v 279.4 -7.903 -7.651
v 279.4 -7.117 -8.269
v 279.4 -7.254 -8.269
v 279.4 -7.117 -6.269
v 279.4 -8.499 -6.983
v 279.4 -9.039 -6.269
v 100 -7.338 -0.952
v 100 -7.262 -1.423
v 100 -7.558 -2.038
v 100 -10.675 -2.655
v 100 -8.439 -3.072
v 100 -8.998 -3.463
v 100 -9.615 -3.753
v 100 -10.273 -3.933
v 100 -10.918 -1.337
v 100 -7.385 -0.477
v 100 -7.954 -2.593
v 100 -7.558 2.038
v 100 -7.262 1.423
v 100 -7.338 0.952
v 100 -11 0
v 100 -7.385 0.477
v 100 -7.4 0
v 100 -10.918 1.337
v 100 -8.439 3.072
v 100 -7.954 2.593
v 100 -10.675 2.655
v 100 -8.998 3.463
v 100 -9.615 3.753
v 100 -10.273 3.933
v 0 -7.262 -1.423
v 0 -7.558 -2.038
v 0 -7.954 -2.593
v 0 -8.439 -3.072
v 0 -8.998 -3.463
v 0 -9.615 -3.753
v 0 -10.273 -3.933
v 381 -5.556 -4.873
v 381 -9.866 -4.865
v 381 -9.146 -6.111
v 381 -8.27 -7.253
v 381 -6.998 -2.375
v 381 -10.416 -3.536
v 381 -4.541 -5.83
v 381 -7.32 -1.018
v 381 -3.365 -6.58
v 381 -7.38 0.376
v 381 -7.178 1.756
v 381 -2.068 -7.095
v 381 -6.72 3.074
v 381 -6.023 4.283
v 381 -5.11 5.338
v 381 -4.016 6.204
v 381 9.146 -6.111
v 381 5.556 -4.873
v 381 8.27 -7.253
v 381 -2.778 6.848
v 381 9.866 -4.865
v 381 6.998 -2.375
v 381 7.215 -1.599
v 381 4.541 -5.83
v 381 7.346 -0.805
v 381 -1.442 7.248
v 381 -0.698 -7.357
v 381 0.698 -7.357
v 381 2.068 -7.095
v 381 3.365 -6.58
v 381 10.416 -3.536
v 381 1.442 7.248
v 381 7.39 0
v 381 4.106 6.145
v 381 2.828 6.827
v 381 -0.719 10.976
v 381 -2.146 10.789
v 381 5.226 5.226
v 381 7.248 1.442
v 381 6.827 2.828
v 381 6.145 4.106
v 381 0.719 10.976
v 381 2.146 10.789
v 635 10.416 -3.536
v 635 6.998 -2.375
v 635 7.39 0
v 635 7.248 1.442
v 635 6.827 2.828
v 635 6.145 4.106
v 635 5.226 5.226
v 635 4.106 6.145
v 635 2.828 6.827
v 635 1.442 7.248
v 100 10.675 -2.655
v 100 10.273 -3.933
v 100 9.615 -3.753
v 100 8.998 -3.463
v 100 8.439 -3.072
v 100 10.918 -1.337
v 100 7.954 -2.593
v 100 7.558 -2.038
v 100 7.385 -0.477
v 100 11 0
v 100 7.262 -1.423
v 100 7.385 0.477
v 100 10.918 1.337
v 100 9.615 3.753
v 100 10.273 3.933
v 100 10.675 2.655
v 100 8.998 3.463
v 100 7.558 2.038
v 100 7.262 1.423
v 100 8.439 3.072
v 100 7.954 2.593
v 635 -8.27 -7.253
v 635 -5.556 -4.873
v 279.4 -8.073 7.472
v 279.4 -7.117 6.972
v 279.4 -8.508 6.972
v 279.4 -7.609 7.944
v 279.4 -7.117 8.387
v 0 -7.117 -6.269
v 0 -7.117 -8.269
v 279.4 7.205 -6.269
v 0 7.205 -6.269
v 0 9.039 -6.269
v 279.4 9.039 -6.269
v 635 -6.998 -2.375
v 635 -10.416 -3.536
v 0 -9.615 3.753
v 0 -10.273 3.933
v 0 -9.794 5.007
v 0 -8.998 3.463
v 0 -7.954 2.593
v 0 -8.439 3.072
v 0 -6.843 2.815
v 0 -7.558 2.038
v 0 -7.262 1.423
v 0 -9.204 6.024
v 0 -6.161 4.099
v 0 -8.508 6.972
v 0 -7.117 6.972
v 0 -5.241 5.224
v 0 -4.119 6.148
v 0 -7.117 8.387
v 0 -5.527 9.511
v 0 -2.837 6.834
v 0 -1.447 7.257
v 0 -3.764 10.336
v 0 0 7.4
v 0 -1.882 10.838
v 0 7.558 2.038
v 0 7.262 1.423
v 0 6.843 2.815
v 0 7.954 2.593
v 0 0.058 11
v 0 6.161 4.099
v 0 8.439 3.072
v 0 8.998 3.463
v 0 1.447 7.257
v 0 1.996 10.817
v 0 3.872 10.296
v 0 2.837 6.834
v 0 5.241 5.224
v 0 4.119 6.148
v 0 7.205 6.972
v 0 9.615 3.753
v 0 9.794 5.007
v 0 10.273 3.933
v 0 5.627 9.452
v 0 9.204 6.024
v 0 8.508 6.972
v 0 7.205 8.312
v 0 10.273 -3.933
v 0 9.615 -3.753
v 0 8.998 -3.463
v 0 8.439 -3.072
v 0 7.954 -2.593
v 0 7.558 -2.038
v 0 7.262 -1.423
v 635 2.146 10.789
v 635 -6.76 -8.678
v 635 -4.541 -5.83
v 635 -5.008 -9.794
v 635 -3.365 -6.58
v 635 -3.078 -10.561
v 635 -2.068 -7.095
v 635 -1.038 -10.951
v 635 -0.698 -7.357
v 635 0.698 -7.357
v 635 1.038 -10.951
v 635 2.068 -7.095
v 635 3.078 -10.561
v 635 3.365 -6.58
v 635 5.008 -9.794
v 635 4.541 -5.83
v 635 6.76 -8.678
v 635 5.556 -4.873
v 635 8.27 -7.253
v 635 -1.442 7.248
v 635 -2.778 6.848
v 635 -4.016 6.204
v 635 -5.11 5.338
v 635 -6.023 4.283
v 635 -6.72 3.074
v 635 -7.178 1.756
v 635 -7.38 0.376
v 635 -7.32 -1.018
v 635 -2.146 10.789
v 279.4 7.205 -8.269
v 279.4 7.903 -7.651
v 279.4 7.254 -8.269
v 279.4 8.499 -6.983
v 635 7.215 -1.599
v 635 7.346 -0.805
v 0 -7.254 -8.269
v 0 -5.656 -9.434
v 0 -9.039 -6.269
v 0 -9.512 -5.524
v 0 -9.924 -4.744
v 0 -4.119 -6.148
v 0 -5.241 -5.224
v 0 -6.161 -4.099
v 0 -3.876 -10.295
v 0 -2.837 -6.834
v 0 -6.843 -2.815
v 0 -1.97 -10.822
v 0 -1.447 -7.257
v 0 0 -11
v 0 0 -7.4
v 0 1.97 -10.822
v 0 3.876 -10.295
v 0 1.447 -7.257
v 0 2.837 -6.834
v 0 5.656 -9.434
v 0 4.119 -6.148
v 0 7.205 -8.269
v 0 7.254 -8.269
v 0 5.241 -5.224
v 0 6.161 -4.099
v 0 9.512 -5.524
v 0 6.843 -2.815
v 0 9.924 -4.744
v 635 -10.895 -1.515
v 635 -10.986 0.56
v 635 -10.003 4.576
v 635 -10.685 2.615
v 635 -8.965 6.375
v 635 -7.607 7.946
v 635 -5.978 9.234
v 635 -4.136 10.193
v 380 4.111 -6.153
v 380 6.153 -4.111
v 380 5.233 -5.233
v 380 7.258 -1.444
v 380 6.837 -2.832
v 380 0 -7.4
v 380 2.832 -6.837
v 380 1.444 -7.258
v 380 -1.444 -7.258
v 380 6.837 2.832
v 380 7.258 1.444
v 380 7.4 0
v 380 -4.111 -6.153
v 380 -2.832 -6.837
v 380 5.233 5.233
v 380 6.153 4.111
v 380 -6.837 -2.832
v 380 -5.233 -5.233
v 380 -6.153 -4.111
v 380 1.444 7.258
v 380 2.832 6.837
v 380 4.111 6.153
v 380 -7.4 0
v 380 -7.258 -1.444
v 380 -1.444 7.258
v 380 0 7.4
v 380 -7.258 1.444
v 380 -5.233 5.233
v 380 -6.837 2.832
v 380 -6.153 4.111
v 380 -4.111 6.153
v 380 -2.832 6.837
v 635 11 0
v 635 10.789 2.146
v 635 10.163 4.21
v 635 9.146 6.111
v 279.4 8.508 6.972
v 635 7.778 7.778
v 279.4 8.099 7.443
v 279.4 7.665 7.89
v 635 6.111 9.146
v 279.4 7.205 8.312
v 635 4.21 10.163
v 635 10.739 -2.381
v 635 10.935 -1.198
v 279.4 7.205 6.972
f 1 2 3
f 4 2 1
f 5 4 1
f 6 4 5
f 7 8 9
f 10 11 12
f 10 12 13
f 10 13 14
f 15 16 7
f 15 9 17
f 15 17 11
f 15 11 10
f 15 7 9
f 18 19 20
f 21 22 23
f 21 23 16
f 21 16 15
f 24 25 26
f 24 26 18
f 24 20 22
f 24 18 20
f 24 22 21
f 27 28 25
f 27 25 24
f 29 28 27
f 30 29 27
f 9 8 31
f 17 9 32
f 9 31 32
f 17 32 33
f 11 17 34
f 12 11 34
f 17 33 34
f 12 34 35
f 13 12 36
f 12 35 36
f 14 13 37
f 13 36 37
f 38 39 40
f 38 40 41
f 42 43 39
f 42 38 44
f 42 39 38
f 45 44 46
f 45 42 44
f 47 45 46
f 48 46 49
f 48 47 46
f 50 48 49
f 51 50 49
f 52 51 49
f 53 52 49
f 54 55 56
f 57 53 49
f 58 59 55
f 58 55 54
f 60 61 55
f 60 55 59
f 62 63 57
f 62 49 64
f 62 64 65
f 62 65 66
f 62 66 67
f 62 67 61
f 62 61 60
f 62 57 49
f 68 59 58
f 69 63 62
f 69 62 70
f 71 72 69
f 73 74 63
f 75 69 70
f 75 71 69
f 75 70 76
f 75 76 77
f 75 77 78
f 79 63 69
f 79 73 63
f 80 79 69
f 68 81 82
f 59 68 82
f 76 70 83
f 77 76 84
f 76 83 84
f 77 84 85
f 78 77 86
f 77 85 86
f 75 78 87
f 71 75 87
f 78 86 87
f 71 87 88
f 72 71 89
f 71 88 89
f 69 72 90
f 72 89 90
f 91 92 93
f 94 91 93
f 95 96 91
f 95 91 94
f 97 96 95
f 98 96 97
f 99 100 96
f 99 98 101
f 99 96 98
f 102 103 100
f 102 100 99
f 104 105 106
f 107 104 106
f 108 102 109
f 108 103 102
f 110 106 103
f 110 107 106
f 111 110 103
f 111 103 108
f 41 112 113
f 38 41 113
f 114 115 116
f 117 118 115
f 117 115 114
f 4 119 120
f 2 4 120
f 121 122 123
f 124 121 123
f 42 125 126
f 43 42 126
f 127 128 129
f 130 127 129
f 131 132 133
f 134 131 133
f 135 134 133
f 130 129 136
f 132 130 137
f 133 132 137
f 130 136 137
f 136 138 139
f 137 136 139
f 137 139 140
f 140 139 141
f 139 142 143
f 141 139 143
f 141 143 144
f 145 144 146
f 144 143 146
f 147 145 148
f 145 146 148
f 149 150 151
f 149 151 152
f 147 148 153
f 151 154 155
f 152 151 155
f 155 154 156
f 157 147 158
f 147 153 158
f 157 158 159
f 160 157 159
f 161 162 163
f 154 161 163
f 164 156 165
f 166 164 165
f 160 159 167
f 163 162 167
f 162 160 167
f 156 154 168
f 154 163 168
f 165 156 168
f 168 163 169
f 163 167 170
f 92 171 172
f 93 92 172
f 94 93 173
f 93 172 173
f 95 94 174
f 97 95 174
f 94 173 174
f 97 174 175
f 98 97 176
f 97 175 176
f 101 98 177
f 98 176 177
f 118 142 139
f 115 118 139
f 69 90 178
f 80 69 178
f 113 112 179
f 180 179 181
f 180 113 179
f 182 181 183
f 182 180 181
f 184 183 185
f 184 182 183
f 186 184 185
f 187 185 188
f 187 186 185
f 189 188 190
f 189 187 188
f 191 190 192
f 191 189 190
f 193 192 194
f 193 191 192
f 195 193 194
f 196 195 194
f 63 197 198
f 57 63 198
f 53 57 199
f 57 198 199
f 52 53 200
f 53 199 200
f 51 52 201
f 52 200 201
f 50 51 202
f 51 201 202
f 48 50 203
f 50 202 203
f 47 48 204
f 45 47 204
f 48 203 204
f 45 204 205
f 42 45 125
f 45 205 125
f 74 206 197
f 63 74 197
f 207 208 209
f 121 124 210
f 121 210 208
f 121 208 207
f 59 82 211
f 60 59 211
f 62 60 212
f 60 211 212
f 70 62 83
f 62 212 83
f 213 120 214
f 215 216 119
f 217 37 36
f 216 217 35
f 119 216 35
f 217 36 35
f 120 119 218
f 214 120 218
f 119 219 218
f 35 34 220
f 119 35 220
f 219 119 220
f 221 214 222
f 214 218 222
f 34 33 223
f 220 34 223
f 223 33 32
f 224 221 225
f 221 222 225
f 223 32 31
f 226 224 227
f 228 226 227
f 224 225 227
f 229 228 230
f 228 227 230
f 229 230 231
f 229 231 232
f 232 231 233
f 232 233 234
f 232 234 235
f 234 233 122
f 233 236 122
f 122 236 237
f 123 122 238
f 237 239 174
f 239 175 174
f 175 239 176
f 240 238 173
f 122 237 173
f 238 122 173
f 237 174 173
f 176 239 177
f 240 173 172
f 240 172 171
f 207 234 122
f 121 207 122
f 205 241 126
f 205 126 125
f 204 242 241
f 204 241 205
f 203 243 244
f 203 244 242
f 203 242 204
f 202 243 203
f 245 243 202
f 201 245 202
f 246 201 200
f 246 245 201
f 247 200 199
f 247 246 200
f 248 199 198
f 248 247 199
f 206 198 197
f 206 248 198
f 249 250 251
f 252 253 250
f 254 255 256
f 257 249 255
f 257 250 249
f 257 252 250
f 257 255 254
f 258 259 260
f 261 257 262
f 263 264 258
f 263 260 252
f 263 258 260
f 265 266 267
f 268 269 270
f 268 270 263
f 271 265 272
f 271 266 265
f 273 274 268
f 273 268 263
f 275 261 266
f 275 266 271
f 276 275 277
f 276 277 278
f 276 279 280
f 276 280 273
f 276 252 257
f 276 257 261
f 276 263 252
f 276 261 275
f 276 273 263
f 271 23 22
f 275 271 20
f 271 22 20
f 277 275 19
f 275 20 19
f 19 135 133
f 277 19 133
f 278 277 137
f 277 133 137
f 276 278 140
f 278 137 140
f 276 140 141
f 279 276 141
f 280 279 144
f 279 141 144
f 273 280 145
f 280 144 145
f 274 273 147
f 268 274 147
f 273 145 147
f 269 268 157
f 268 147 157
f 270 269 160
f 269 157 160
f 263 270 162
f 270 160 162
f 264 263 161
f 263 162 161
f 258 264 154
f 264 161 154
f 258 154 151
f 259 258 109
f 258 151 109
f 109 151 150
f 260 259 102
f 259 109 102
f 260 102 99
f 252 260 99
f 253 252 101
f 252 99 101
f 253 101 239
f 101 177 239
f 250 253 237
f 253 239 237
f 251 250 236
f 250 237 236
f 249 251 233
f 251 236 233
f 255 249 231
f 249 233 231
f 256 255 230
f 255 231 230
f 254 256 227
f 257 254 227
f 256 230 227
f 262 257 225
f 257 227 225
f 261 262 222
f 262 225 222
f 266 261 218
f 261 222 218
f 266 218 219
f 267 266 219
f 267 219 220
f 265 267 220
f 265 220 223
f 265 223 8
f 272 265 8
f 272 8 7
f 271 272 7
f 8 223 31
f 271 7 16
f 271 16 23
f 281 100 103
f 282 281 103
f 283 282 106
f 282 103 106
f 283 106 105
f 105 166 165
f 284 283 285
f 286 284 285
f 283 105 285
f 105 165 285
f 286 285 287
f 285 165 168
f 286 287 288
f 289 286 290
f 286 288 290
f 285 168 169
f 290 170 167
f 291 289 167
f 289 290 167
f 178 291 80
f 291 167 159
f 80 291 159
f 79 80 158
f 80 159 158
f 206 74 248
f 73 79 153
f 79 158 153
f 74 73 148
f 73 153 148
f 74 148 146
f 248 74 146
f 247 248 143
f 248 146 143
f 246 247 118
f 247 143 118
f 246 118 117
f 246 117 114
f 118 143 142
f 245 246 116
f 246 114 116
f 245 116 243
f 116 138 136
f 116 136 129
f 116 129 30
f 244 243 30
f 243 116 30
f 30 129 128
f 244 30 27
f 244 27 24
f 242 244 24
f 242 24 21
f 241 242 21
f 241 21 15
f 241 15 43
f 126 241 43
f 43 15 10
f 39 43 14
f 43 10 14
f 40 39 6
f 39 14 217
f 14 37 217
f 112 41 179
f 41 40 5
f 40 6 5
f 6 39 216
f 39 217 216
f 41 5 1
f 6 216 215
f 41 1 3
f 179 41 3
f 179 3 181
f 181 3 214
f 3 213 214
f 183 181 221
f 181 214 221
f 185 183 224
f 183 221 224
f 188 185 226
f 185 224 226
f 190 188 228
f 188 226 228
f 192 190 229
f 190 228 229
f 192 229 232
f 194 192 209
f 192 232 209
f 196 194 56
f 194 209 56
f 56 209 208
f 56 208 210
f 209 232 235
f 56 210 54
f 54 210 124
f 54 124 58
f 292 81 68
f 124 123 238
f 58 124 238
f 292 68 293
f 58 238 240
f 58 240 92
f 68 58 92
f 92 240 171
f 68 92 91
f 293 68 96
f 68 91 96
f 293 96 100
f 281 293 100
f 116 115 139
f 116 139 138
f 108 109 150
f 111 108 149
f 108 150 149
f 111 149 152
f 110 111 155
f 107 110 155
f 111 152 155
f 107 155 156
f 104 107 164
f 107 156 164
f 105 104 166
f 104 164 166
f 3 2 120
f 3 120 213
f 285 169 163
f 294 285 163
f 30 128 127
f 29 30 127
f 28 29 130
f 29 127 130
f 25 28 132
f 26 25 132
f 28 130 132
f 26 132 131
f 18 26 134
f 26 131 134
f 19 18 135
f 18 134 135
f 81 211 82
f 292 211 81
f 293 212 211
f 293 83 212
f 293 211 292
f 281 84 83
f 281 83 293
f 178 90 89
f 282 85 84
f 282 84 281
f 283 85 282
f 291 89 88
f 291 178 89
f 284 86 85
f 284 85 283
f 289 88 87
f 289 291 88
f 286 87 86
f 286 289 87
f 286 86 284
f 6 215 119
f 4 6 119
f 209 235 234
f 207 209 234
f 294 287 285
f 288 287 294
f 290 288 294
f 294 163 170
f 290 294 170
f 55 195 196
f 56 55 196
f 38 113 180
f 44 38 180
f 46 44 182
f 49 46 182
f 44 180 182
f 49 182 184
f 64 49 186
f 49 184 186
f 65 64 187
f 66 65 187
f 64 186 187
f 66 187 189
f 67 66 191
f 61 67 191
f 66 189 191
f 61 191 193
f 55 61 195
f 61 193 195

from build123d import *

# Parameters (mm, degrees)
F0_R     = 11
F1_DEPTH = 635
F3_DEPTH = 254
F4_R     = 7.4
F5_DEPTH = 380
F7_DEPTH = 279.4
F8_DEPTH = 100


with BuildPart() as f1:
    # F0 (on Right) → F1 (new body)
    with BuildSketch(Plane.YZ):
        Circle(F0_R)
    extrude(amount=F1_DEPTH)

    # F2 (on face) → F3 (cut)
    with BuildSketch(Plane.YZ.offset(635)):
        with BuildLine():
            ThreePointArc((0, 7.39), (0.724346667, 7.3544151301), (1.4417174797, 7.2480032222))
            Line((1.4417174797, 7.2480032222), (2.1459935422, 10.7886380844))
            ThreePointArc((2.1459935422, 10.7886380844), (0, 11), (-2.1459935422, 10.7886380844))
            Line((-2.1459935422, 10.7886380844), (-1.4417174797, 7.2480032222))
            ThreePointArc((-1.4417174797, 7.2480032222), (-0.724346667, 7.3544151301), (0, 7.39))
        make_face()
        with BuildLine():
            Line((-6.997813657, -2.3754376486), (0, 0))
            Line((0, 0), (-1.4417174797, 7.2480032222))
            ThreePointArc((-1.4417174797, 7.2480032222), (-6.399927734, 3.695), (-6.997813657, -2.3754376486))
        make_face()
        with BuildLine():
            Line((-5.5560961773, -4.8725655736), (0, 0))
            Line((0, 0), (-6.997813657, -2.3754376486))
            ThreePointArc((-6.997813657, -2.3754376486), (-6.399927734, -3.695), (-5.5560961773, -4.8725655736))
        make_face()
        with BuildLine():
            Line((5.5560961773, -4.8725655736), (0, 0))
            Line((0, 0), (-5.5560961773, -4.8725655736))
            ThreePointArc((-5.5560961773, -4.8725655736), (0, -7.39), (5.5560961773, -4.8725655736))
        make_face()
        with BuildLine():
            ThreePointArc((5.5560961773, -4.8725655736), (6.399927734, -3.695), (6.997813657, -2.3754376486))
            Line((6.997813657, -2.3754376486), (0, 0))
            Line((0, 0), (5.5560961773, -4.8725655736))
        make_face()
        with BuildLine():
            ThreePointArc((6.997813657, -2.3754376486), (7.2912942241, -1.2037975484), (7.39, 0))
            ThreePointArc((7.39, 0), (5.7125472504, 4.68816637), (1.4417174797, 7.2480032222))
            Line((1.4417174797, 7.2480032222), (0, 0))
            Line((0, 0), (6.997813657, -2.3754376486))
        make_face()
        with BuildLine():
            Line((0, 0), (1.4417174797, 7.2480032222))
            ThreePointArc((1.4417174797, 7.2480032222), (0.724346667, 7.3544151301), (0, 7.39))
            Line((0, 7.39), (0, 0))
        make_face()
        with BuildLine():
            Line((0, 0), (0, 7.39))
            ThreePointArc((0, 7.39), (-0.724346667, 7.3544151301), (-1.4417174797, 7.2480032222))
            Line((-1.4417174797, 7.2480032222), (0, 0))
        make_face()
        with BuildLine():
            ThreePointArc((-5.5560961773, -4.8725655736), (-6.399927734, -3.695), (-6.997813657, -2.3754376486))
            Line((-6.997813657, -2.3754376486), (-10.4162314244, -3.5358341183))
            ThreePointArc((-10.4162314244, -3.5358341183), (-9.5262794416, -5.5), (-8.2702378823, -7.2528039661))
            Line((-8.2702378823, -7.2528039661), (-5.5560961773, -4.8725655736))
        make_face()
        with BuildLine():
            Line((10.4162314244, -3.5358341183), (6.997813657, -2.3754376486))
            ThreePointArc((6.997813657, -2.3754376486), (6.399927734, -3.695), (5.5560961773, -4.8725655736))
            Line((5.5560961773, -4.8725655736), (8.2702378823, -7.2528039661))
            ThreePointArc((8.2702378823, -7.2528039661), (9.5262794416, -5.5), (10.4162314244, -3.5358341183))
        make_face()
    extrude(amount=-F3_DEPTH, mode=Mode.SUBTRACT)

    # F4 (on face) → F5 (cut)
    with BuildSketch(Plane(origin=(0, 0, 0), x_dir=(0, -1, 0), z_dir=(-1, 0, 0))):
        Circle(F4_R)
    extrude(amount=-F5_DEPTH, mode=Mode.SUBTRACT)

    # F6 (on face) → F7 (cut)
    with BuildSketch(Plane(origin=(0, 0, 0), x_dir=(0, -1, 0), z_dir=(-1, 0, 0))):
        with BuildLine():
            Line((7.1172844619, 8.3871486149), (7.1172844619, 6.972222589))
            Line((7.1172844619, 6.972222589), (8.5081203665, 6.972222589))
            ThreePointArc((8.5081203665, 6.972222589), (7.8446684396, 7.7111073831), (7.1172844619, 8.3871486149))
        make_face()
        with BuildLine():
            ThreePointArc((-9.0388867634, -6.2688536495), (-8.2077799909, -7.3234109281), (-7.2543820773, -8.2688536495))
            Line((-7.2543820773, -8.2688536495), (-7.2051168904, -8.2688536495))
            Line((-7.2051168904, -8.2688536495), (-7.2051168904, -6.2688536495))
            Line((-7.2051168904, -6.2688536495), (-9.0388867634, -6.2688536495))
        make_face()
        with BuildLine():
            ThreePointArc((7.2543820773, -8.2688536495), (8.2077799909, -7.3234109281), (9.0388867634, -6.2688536495))
            Line((9.0388867634, -6.2688536495), (7.1172844619, -6.2688536495))
            Line((7.1172844619, -6.2688536495), (7.1172844619, -8.2688536495))
            Line((7.1172844619, -8.2688536495), (7.2543820773, -8.2688536495))
        make_face()
        with BuildLine():
            Line((-7.2051168904, 6.972222589), (-7.2051168904, 8.3118163235))
            ThreePointArc((-7.2051168904, 8.3118163235), (-7.8851178885, 7.6697402749), (-8.5081203665, 6.972222589))
            Line((-8.5081203665, 6.972222589), (-7.2051168904, 6.972222589))
        make_face()
    extrude(amount=-F7_DEPTH, mode=Mode.SUBTRACT)

    # F6 (on face) → F8 (cut)
    with BuildSketch(Plane(origin=(0, 0, 0), x_dir=(0, -1, 0), z_dir=(-1, 0, 0))):
        with BuildLine():
            ThreePointArc((11, 0), (10.8166538264, 2), (10.2727272727, 3.9333286641))
            ThreePointArc((10.2727272727, 3.9333286641), (8.4387429279, 3.0724521494), (7.2618181818, 1.4233751066))
            ThreePointArc((7.2618181818, 1.4233751066), (7.3653735325, 0.7150333749), (7.4, 0))
            ThreePointArc((7.4, 0), (7.3653735325, -0.7150333749), (7.2618181818, -1.4233751066))
            ThreePointArc((7.2618181818, -1.4233751066), (8.4387429279, -3.0724521494), (10.2727272727, -3.9333286641))
            ThreePointArc((10.2727272727, -3.9333286641), (10.8166538264, -2), (11, 0))
        make_face()
        with BuildLine():
            ThreePointArc((-7.2618181818, -1.4233751066), (-7.4, 0), (-7.2618181818, 1.4233751066))
            ThreePointArc((-7.2618181818, 1.4233751066), (-8.4387429279, 3.0724521494), (-10.2727272727, 3.9333286641))
            ThreePointArc((-10.2727272727, 3.9333286641), (-11, 0), (-10.2727272727, -3.9333286641))
            ThreePointArc((-10.2727272727, -3.9333286641), (-8.4387429279, -3.0724521494), (-7.2618181818, -1.4233751066))
        make_face()
    extrude(amount=-F8_DEPTH, mode=Mode.SUBTRACT)


solid = f1.part
